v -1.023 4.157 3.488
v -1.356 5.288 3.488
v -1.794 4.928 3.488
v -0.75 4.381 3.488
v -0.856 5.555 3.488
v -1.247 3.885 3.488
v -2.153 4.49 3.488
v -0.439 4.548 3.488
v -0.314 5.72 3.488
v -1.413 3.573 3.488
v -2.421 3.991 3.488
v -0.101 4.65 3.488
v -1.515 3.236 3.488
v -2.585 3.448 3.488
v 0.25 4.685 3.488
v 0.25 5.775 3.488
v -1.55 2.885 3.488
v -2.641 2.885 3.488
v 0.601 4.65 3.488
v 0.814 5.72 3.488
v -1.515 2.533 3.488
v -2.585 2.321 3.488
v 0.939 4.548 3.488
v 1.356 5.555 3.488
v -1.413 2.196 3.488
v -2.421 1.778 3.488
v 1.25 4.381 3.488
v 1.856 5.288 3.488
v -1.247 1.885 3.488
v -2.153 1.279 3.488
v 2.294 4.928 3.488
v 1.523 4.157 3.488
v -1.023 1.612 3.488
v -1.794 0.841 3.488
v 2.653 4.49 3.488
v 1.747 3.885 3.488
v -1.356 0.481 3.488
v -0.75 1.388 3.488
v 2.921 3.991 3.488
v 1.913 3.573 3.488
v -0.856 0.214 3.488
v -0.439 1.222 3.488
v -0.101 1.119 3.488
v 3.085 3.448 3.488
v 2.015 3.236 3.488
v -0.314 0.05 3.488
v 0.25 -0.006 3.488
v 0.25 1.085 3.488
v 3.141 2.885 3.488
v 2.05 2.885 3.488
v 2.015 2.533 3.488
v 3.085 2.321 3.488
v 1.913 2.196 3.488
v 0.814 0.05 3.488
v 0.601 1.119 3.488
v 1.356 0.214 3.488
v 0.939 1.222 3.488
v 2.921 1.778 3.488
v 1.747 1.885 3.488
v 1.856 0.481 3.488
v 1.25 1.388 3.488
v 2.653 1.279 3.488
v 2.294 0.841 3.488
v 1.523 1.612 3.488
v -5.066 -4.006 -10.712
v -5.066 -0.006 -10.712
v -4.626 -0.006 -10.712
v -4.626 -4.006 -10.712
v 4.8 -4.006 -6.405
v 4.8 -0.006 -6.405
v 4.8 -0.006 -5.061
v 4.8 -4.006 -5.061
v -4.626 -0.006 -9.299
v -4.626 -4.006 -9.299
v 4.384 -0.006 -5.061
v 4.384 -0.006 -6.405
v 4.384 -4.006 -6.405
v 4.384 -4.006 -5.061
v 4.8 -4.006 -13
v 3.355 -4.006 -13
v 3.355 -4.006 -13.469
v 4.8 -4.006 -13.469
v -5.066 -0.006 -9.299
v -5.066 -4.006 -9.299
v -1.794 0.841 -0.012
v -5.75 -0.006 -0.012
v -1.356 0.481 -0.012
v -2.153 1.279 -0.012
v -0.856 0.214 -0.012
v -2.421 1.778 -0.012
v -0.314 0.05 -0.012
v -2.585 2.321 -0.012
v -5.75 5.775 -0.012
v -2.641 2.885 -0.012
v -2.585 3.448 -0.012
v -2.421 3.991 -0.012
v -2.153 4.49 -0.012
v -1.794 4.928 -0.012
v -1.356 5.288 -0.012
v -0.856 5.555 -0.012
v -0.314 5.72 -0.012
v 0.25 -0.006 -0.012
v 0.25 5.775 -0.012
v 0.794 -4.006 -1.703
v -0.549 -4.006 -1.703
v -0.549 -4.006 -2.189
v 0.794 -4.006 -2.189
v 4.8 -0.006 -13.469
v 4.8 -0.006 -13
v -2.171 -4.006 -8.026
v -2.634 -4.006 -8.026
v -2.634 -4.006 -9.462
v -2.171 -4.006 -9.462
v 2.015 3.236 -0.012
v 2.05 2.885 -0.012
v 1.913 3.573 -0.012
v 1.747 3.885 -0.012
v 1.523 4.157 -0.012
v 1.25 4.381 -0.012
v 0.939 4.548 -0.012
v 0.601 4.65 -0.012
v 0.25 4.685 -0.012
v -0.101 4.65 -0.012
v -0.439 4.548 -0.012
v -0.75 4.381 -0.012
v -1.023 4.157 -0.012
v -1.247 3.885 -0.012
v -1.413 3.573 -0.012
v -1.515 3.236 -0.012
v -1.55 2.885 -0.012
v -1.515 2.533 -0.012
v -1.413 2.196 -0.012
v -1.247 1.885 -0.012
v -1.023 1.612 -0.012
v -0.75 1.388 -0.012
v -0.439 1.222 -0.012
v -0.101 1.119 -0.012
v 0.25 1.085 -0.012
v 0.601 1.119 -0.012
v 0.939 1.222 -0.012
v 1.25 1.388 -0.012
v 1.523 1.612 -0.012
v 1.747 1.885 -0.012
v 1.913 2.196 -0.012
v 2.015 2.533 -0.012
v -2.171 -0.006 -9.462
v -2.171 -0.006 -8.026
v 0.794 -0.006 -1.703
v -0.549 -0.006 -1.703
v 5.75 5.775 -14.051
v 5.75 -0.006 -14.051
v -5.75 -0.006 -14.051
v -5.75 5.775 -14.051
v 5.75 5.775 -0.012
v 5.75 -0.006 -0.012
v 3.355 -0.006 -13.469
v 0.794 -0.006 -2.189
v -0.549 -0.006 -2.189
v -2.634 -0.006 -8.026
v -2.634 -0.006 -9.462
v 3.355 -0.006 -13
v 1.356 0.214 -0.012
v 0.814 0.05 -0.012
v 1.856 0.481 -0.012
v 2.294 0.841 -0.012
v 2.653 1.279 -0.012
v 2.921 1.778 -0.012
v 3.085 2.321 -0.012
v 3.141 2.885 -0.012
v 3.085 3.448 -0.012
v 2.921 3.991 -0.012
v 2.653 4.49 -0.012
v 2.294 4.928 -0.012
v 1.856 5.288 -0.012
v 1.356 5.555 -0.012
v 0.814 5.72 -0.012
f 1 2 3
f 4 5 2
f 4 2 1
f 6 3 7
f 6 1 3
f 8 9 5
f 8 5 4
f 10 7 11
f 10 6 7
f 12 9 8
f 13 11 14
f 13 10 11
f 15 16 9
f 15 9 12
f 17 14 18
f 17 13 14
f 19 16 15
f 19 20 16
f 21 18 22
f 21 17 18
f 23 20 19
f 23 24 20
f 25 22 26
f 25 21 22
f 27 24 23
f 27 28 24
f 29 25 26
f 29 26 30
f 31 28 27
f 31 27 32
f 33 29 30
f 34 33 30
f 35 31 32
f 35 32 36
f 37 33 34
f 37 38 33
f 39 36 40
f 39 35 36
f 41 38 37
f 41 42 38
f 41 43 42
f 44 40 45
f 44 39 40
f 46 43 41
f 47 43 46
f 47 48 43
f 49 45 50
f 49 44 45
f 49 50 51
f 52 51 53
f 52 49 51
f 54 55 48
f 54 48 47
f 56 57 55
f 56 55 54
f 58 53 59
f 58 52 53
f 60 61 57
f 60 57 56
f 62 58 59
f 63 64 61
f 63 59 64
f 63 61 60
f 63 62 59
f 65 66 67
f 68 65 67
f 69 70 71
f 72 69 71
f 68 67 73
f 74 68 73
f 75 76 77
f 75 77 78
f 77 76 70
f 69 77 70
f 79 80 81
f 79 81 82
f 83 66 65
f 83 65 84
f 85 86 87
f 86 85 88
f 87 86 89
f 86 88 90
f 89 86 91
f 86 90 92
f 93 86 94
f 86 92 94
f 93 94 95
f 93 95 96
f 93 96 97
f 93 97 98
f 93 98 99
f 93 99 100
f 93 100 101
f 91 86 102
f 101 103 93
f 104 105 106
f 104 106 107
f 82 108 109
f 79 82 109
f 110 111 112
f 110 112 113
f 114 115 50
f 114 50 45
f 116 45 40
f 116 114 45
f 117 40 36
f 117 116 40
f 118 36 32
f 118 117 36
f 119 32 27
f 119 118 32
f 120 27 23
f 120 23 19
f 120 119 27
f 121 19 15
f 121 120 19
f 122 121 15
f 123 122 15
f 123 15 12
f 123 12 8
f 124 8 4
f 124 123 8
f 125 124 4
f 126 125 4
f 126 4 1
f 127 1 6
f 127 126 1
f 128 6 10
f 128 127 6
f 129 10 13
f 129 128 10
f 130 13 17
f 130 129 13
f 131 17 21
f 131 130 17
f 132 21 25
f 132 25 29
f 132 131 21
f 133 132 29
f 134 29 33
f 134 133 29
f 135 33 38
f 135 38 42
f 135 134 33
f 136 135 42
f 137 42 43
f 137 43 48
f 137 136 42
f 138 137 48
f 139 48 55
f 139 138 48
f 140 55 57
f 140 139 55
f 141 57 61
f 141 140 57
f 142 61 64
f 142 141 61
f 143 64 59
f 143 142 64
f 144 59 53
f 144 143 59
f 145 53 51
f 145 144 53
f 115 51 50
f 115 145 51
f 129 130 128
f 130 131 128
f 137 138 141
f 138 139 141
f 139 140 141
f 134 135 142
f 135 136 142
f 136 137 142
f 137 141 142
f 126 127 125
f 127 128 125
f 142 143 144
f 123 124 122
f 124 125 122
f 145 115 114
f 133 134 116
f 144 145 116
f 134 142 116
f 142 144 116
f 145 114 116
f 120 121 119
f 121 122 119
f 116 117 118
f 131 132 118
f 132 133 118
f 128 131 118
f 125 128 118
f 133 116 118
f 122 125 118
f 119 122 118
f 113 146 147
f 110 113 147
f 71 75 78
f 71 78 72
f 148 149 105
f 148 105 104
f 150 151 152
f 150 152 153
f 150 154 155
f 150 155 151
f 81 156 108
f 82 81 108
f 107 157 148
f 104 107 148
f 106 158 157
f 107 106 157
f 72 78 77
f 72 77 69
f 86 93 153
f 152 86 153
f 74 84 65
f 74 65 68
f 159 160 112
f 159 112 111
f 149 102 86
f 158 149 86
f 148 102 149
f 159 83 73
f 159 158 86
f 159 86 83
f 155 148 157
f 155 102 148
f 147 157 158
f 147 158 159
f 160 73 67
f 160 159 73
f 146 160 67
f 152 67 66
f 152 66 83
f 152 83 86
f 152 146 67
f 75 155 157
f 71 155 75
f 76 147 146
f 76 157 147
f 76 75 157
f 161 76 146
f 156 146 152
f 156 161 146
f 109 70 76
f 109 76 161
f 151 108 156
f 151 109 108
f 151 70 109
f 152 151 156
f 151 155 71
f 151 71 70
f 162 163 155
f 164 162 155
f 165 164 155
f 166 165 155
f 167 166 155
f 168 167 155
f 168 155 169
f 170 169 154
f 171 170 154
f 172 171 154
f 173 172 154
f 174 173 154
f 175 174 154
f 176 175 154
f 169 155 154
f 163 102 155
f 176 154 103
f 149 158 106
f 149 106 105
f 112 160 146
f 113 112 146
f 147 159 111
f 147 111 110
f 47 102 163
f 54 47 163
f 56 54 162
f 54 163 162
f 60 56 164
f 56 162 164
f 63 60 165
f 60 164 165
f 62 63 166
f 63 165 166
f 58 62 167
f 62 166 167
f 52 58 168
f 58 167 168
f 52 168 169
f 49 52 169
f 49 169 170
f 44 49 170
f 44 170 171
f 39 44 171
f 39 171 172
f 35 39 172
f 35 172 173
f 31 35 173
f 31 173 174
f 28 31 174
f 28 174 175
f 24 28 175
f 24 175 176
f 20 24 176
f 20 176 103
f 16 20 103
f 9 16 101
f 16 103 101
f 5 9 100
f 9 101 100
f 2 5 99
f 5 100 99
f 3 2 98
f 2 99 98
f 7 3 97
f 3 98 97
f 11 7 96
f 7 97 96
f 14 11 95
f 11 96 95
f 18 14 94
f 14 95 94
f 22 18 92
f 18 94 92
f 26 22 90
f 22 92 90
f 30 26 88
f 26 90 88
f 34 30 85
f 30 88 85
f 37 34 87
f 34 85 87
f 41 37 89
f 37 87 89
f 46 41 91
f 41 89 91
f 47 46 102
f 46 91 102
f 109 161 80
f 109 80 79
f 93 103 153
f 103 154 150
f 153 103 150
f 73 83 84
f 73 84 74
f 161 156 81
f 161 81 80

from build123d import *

# Parameters (mm, degrees)
SKETCH_1_W      = 14.039038814
SKETCH_1_H      = 5.781099621
EXTRUDE_1_DEPTH = 5.75
SKETCH_2_R      = 2.89054981
SKETCH_2_R_2    = 1.8
EXTRUDE_2_DEPTH = 3.5
SKETCH_3_W      = 1.445545422
SKETCH_3_H      = 0.46914779
SKETCH_3_W_2    = 0.440036949
SKETCH_3_H_2    = 1.412750204
SKETCH_3_W_3    = 0.463196789
SKETCH_3_H_3    = 1.435910044
SKETCH_3_W_4    = 0.41687711
SKETCH_3_H_4    = 1.343270685
SKETCH_3_W_5    = 1.343270686
SKETCH_3_H_5    = 0.486356628
EXTRUDE_3_DEPTH = 4


with BuildPart() as part:
    # Эскиз1 → Бобышка-Вытянуть1 (new, symmetric)
    with BuildSketch(Plane(origin=(0, 0, 0), x_dir=(0, 0, -1), z_dir=(1, 0, 0))):
        with Locations((7.031108734, 2.884562427)):
            Rectangle(SKETCH_1_W, SKETCH_1_H)
    extrude(amount=EXTRUDE_1_DEPTH, both=True)

    # Эскиз2 → Бобышка-Вытянуть2 (add)
    with BuildSketch(Plane.XY.offset(-0.011589327)):
        with Locations(Location((0.25, 2.884562426, 0), (0, 0, 270))):
            Circle(SKETCH_2_R)
        with Locations((0.25, 2.884562426)):
            Circle(SKETCH_2_R_2, mode=Mode.SUBTRACT)
    extrude(amount=EXTRUDE_2_DEPTH)

    # Эскиз3 → Бобышка-Вытянуть3 (add)
    with BuildSketch(Plane.XZ.offset(0.005987384)):
        with Locations((4.077721902, -13.234721413)):
            Rectangle(SKETCH_3_W, SKETCH_3_H)
        with Locations((-4.845578503, -10.005870434)):
            Rectangle(SKETCH_3_W_2, SKETCH_3_H_2)
        with Locations((-2.402215445, -8.743659186)):
            Rectangle(SKETCH_3_W_3, SKETCH_3_H_3)
        with Locations((4.592056058, -5.732880063)):
            Rectangle(SKETCH_3_W_4, SKETCH_3_H_4)
        with Locations((0.122207051, -1.946246319)):
            Rectangle(SKETCH_3_W_5, SKETCH_3_H_5)
    extrude(amount=EXTRUDE_3_DEPTH)


solid = part.part
